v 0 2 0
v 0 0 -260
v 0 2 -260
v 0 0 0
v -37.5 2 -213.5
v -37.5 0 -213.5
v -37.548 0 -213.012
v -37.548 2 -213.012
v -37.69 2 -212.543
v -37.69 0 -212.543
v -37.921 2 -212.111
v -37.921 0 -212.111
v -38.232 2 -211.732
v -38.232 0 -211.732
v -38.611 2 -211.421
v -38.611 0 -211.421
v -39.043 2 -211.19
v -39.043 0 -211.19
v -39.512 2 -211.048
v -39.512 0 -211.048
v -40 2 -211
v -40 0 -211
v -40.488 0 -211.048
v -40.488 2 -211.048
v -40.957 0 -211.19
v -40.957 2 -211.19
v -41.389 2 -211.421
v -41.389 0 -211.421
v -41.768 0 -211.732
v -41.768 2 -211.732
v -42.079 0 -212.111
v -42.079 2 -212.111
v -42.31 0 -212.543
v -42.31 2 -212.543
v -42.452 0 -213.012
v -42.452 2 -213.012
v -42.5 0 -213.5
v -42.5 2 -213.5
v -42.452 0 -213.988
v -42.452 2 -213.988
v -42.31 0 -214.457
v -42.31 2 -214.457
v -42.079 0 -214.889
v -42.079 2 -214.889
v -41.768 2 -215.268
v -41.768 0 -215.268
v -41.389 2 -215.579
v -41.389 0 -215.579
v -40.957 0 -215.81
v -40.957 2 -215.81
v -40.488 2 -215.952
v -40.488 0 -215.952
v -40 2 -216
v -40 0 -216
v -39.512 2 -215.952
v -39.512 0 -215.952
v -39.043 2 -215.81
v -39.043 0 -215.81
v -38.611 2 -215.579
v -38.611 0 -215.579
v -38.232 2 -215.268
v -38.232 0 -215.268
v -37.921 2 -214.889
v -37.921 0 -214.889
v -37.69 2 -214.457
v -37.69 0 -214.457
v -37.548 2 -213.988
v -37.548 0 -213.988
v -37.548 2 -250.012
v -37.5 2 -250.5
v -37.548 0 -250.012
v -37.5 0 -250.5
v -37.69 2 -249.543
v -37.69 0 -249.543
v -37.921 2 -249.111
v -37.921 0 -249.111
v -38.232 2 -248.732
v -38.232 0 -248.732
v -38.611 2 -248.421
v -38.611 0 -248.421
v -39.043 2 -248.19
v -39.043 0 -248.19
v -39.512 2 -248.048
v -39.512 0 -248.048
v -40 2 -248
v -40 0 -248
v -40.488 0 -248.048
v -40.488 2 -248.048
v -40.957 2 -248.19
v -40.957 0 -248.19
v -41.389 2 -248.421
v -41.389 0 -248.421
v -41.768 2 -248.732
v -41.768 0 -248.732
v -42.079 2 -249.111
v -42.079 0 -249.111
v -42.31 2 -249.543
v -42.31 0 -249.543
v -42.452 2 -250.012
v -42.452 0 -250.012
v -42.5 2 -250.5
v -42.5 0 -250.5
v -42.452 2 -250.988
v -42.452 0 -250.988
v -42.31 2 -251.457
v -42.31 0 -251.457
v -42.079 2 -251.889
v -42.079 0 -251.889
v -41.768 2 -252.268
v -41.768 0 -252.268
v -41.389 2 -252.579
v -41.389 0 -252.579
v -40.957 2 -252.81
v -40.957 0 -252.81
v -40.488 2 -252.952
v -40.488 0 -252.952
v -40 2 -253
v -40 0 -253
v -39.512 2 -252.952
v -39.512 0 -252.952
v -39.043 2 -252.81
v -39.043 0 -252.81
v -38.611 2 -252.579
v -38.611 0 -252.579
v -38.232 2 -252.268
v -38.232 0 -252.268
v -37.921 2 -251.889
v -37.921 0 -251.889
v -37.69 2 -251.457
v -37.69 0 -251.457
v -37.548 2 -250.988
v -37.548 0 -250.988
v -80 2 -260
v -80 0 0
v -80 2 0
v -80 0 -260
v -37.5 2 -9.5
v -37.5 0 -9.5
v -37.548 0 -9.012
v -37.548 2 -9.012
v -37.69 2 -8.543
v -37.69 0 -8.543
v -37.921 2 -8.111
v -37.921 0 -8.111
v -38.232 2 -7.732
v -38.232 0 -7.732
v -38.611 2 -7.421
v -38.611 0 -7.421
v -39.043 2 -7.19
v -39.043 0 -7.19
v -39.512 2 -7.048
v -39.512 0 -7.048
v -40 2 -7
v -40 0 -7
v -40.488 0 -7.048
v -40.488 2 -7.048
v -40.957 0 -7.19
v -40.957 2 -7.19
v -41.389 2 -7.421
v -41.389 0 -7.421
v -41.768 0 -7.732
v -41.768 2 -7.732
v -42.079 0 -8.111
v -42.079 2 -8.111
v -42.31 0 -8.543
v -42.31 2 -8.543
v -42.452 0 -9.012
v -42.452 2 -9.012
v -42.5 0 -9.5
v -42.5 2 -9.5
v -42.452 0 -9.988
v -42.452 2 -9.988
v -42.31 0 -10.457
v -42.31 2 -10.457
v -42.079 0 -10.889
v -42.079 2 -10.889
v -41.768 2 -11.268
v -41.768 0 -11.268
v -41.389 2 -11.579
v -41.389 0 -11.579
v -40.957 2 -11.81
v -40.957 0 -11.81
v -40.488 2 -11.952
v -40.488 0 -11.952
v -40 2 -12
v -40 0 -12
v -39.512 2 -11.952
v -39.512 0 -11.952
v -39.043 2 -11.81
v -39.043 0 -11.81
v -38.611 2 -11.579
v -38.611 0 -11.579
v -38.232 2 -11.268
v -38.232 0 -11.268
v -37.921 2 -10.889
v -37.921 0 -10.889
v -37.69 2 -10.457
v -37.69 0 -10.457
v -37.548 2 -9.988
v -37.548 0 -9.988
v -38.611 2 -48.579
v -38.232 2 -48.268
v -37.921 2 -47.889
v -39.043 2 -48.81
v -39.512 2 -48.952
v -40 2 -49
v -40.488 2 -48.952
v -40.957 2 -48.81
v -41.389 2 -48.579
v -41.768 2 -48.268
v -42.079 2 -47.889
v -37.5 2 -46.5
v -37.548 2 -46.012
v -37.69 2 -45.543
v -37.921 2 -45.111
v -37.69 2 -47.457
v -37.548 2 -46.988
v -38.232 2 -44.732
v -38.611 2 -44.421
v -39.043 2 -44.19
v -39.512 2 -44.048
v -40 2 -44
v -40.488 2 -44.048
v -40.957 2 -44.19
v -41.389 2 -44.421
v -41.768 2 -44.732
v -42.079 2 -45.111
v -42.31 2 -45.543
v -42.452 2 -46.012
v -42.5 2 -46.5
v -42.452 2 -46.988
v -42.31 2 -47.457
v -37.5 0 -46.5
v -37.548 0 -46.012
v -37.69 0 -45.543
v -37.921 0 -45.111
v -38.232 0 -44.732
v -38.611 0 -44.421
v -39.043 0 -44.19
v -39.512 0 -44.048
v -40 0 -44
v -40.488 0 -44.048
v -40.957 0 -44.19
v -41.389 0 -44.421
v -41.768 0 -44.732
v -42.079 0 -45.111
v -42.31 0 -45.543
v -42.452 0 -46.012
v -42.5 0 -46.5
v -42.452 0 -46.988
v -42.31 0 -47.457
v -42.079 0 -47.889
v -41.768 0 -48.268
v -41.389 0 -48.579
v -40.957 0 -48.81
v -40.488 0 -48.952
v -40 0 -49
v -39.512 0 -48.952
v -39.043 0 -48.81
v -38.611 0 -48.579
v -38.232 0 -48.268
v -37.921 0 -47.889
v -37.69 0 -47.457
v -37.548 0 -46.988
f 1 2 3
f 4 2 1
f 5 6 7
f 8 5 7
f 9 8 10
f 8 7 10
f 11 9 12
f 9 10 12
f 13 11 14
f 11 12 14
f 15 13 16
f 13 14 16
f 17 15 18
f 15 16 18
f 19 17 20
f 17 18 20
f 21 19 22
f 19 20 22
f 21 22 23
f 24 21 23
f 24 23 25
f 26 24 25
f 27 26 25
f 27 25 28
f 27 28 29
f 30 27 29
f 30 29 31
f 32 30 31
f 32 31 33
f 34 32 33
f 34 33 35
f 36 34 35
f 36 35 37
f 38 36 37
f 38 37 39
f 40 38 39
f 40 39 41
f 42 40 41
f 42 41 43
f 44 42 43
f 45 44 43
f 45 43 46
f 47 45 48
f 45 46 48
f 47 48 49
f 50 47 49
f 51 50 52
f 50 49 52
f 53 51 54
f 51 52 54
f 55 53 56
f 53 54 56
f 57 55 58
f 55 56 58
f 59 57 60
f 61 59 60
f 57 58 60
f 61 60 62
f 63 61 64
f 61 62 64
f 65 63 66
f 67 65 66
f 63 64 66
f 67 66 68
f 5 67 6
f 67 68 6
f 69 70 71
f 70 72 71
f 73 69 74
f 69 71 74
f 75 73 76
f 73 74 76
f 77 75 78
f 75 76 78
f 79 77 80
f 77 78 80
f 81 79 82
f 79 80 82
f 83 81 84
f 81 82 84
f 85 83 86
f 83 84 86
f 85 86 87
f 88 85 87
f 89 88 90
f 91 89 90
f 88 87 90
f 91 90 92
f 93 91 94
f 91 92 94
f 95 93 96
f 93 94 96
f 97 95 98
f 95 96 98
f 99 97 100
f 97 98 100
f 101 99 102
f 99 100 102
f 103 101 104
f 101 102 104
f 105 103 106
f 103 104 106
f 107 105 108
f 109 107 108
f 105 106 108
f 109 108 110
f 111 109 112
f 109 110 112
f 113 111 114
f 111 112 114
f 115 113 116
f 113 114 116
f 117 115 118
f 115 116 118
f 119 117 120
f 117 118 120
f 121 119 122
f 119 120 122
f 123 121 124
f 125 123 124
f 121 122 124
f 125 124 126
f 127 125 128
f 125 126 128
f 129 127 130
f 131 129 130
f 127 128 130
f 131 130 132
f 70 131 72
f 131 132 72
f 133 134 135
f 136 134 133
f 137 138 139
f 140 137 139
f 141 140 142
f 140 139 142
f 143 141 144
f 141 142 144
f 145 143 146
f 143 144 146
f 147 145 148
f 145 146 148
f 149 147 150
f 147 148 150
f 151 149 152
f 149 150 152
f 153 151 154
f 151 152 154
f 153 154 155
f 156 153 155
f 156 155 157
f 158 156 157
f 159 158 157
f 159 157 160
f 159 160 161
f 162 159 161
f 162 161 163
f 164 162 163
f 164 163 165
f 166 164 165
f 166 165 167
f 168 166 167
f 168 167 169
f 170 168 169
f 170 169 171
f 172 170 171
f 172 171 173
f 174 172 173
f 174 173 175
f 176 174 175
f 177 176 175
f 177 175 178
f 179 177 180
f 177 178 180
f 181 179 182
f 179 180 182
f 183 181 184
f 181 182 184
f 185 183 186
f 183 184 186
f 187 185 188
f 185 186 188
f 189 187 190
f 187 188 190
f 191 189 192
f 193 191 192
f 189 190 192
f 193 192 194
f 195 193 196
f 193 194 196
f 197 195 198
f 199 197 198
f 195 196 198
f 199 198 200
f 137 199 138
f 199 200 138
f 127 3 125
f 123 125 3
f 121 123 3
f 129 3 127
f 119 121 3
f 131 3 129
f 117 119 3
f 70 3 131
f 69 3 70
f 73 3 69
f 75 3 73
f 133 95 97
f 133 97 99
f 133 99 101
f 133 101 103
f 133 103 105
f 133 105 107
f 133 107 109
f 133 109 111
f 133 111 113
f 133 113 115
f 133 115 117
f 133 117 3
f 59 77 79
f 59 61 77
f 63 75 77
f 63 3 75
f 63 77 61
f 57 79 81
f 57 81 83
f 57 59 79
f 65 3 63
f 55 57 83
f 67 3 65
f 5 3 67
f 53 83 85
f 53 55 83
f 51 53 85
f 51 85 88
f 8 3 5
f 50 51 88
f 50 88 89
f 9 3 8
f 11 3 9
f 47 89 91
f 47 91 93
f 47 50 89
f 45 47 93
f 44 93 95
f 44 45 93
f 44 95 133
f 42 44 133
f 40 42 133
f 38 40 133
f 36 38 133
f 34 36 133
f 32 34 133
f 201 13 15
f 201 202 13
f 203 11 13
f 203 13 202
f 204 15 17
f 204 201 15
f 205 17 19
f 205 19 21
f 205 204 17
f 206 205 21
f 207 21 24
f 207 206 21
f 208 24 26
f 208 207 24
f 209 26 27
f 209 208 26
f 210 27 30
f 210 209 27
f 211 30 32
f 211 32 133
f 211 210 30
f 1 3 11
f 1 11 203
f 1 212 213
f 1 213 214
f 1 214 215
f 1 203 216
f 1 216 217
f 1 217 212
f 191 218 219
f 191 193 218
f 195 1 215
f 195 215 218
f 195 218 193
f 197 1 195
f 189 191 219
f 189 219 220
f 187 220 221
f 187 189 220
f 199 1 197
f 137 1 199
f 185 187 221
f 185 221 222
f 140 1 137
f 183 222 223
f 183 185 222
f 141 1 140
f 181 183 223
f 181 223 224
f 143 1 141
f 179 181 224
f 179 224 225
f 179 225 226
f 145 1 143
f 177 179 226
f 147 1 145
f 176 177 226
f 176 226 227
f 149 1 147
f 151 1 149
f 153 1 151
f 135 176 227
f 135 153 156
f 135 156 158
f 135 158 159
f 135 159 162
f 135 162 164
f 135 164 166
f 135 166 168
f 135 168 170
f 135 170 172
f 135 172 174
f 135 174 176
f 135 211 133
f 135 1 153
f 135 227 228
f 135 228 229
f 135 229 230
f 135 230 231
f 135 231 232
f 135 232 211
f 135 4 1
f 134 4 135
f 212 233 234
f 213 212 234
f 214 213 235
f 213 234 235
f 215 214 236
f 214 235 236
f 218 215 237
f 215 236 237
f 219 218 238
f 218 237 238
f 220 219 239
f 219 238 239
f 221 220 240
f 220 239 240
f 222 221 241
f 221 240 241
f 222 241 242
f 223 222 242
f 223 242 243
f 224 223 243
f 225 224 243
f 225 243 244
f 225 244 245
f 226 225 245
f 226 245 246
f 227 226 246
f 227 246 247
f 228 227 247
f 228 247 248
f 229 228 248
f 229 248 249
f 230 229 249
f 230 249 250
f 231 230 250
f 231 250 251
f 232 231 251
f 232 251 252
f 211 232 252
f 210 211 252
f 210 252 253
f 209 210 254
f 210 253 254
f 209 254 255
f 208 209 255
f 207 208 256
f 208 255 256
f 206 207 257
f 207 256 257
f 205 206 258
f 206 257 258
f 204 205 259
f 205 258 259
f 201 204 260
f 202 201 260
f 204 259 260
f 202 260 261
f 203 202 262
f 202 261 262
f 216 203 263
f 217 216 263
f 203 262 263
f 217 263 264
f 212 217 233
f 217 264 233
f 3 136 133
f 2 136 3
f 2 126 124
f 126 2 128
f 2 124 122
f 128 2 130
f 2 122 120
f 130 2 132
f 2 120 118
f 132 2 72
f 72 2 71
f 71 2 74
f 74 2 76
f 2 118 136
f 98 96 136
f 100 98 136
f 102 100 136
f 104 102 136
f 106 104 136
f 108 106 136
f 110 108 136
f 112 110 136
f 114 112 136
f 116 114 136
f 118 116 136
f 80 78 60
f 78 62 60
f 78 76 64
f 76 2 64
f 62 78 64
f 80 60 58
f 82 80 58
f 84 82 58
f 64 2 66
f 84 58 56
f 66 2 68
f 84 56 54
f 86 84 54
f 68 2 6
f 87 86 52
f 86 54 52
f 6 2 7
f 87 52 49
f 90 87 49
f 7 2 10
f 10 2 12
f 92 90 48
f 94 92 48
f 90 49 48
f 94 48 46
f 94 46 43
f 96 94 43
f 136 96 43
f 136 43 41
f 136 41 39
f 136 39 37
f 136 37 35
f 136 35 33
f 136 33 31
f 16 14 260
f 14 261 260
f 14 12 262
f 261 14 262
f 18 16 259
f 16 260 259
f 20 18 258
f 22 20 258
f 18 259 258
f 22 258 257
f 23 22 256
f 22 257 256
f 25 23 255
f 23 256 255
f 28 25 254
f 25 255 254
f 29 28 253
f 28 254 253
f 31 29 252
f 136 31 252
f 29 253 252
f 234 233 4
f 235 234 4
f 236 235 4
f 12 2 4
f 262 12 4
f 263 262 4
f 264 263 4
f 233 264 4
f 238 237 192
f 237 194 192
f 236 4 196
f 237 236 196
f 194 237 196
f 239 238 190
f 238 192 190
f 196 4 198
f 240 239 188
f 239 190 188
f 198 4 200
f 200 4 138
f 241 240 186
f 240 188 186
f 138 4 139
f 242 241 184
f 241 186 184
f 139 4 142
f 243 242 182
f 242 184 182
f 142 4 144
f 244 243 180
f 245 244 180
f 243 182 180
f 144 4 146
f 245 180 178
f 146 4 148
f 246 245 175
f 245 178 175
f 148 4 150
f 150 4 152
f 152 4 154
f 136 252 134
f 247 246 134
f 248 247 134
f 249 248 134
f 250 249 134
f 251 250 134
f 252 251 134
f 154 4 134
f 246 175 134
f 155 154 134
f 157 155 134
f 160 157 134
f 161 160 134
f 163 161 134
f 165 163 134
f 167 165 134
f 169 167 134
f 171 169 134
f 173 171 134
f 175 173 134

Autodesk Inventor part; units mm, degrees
ref_plane "YZ Plane" through (0, 0, 0) normal (1, 0, 0) x (0, 1, 0)
ref_plane "XZ Plane" through (0, 0, 0) normal (0, 1, 0) x (-1, 0, 0)
ref_plane "XY Plane" through (0, 0, 0) normal (0, 0, 1) x (1, 0, 0)
sketch "スケッチ1" plane through (0, 0, 0) normal (0, 1, 0) x (-1, 0, 0)
  line L0 (0, 0) -> (80, 0)
  line L1 (80, 0) -> (80, -260)
  line L2 (80, -260) -> (0, -260)
  line L3 (0, -260) -> (0, 0)
  dimension "d0" = 80
  dimension "d1" = 260
extrude "押し出し1" add sketch "スケッチ1" along normal blind 2
sketch "スケッチ2" plane through (0, 0, 0) normal (0, -1, 0) x (1, 0, 0)
  circle A0 centre (-40, -9.5) radius 2.5
  line L0 (0, -260) -> (0, 0) projected
  line L1 (0, 0) -> (-80, 0) projected
  circle A1 centre (-40, -46.5) radius 2.5
  circle A2 centre (-40, -250.5) radius 2.5
  circle A3 centre (-40, -213.5) radius 2.5
  line L2 (-80, -260) -> (0, -260) projected
  dimension "d4" = 5
  dimension "d6" = 40
  dimension "d7" = 9.5
  dimension "d8" = 5
  dimension "d10" = 40
  dimension "d11" = 5
  dimension "d12" = 5
  dimension "d13" = 40
  dimension "d14" = 9.5
  dimension "d15" = 40
  dimension "d28" = 37
  dimension "d29" = 37
extrude "押し出し2" cut sketch "スケッチ2" against normal blind 10
